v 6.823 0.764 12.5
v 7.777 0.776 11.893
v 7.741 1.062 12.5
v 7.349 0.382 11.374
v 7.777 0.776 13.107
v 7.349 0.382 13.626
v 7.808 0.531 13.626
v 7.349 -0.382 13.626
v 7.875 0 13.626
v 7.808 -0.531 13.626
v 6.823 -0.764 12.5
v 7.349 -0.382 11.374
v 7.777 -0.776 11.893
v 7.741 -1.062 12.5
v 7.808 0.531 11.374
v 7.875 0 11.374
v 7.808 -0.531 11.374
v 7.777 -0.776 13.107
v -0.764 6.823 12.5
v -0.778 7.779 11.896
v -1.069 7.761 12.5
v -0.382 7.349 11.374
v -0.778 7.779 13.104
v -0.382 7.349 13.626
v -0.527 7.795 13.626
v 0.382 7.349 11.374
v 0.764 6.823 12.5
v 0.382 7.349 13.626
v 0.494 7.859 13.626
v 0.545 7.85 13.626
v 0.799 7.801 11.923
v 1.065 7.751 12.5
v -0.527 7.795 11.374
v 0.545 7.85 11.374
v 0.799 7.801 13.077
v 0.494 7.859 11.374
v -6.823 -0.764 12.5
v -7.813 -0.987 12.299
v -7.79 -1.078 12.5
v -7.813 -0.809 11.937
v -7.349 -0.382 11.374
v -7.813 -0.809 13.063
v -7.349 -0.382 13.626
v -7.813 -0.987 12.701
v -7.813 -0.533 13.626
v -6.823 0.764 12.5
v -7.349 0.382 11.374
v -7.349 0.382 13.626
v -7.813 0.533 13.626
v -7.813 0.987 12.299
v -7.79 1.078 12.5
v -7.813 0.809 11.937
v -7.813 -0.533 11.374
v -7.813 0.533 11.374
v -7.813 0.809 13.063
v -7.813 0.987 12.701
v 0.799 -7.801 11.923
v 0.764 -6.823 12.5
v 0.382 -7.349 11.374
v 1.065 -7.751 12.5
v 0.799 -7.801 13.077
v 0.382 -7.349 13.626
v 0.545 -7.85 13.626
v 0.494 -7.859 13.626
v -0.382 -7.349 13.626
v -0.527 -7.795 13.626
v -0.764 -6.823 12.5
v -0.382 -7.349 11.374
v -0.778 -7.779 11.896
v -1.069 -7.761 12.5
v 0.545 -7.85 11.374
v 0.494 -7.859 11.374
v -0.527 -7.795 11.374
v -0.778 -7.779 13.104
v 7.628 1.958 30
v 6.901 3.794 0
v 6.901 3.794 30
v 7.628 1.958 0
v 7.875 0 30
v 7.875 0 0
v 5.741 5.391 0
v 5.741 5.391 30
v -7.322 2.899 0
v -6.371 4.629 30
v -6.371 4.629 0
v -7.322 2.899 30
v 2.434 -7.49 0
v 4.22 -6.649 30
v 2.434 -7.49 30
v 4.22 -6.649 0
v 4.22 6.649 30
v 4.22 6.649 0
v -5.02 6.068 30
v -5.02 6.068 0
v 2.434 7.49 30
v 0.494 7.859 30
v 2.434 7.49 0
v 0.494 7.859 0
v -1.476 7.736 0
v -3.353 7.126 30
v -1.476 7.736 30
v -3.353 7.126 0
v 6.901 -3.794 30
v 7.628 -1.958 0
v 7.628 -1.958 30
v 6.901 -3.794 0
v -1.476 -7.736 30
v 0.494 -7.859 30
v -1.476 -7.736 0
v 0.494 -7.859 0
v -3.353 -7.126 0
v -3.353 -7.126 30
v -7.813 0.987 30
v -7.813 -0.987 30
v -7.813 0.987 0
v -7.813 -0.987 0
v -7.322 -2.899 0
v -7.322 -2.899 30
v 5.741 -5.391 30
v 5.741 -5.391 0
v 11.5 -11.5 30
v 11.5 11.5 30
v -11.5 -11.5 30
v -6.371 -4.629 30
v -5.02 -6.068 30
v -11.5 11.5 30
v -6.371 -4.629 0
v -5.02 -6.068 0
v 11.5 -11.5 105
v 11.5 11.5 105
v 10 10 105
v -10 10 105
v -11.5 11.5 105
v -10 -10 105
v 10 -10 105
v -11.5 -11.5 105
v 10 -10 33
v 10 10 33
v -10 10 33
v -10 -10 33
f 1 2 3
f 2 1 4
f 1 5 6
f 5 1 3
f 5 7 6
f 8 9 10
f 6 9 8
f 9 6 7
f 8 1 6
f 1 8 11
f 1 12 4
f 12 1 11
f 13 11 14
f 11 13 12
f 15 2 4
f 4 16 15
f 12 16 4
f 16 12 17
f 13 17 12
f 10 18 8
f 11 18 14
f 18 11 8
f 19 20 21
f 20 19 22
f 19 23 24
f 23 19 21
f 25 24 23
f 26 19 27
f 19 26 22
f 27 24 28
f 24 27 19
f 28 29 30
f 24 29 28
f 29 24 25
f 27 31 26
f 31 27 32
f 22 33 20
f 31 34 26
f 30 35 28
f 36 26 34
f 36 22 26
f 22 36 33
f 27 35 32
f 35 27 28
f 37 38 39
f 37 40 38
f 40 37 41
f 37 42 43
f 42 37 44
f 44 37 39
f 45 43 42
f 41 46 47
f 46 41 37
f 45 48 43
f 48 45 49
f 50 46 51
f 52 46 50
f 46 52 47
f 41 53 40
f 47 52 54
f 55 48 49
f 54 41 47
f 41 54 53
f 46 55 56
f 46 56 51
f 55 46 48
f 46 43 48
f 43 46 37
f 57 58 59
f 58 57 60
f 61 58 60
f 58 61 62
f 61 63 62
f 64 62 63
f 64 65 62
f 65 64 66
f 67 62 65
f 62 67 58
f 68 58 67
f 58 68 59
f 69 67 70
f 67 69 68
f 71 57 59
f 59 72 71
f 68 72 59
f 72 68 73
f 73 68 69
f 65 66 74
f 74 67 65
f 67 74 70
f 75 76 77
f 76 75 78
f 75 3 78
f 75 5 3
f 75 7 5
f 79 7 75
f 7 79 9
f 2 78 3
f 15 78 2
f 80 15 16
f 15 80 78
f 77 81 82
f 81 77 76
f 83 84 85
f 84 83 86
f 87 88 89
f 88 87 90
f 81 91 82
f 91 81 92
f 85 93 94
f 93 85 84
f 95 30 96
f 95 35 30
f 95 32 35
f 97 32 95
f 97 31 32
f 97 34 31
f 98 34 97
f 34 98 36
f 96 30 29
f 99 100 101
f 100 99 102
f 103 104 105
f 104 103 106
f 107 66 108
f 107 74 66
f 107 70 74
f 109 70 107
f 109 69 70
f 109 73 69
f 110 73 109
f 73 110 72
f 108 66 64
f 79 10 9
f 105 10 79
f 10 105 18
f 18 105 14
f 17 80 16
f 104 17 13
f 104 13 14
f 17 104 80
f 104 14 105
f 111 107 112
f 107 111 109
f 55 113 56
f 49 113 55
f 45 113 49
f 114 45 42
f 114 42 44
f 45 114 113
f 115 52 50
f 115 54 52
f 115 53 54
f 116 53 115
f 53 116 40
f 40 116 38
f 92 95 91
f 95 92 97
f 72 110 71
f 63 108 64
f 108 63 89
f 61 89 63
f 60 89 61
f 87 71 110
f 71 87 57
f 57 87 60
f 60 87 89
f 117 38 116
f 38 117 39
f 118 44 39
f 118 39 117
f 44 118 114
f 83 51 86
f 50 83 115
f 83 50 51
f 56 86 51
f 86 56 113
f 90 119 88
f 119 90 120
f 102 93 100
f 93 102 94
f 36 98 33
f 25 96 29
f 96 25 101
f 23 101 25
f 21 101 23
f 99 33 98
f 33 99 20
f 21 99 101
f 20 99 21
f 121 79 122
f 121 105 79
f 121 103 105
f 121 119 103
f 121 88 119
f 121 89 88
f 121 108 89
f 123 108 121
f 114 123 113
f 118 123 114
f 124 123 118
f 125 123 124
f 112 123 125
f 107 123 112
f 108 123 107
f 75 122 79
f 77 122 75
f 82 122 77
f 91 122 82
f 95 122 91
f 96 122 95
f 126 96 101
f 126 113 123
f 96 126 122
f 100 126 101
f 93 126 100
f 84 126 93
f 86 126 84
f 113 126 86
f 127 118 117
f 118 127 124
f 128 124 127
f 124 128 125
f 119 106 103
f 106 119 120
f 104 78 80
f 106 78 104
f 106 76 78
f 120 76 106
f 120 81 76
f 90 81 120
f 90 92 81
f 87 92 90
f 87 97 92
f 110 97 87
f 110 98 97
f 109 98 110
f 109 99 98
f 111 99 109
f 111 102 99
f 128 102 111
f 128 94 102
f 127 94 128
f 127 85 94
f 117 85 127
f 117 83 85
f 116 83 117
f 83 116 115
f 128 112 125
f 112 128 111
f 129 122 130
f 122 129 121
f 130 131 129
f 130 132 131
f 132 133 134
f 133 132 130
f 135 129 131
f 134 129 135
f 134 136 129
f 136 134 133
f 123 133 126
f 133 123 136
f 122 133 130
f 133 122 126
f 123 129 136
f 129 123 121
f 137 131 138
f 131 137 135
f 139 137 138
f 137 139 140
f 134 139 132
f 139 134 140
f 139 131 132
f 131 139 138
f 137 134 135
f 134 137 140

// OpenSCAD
union(){
    difference(){
    cylinder(r=15.75/2, h=30);
    for(i=[0:90:270]){
        rotate([0,0,i]) translate([15.75/2,0,25/2]) sphere(r=1.3);
    }
    }
    translate([0,0,30]) difference(){
        translate([0,0,75/2])cube([23,23,75],center=true);
        translate([0,0,72/2+3])cube([20,20,72],center=true);
    }
}
